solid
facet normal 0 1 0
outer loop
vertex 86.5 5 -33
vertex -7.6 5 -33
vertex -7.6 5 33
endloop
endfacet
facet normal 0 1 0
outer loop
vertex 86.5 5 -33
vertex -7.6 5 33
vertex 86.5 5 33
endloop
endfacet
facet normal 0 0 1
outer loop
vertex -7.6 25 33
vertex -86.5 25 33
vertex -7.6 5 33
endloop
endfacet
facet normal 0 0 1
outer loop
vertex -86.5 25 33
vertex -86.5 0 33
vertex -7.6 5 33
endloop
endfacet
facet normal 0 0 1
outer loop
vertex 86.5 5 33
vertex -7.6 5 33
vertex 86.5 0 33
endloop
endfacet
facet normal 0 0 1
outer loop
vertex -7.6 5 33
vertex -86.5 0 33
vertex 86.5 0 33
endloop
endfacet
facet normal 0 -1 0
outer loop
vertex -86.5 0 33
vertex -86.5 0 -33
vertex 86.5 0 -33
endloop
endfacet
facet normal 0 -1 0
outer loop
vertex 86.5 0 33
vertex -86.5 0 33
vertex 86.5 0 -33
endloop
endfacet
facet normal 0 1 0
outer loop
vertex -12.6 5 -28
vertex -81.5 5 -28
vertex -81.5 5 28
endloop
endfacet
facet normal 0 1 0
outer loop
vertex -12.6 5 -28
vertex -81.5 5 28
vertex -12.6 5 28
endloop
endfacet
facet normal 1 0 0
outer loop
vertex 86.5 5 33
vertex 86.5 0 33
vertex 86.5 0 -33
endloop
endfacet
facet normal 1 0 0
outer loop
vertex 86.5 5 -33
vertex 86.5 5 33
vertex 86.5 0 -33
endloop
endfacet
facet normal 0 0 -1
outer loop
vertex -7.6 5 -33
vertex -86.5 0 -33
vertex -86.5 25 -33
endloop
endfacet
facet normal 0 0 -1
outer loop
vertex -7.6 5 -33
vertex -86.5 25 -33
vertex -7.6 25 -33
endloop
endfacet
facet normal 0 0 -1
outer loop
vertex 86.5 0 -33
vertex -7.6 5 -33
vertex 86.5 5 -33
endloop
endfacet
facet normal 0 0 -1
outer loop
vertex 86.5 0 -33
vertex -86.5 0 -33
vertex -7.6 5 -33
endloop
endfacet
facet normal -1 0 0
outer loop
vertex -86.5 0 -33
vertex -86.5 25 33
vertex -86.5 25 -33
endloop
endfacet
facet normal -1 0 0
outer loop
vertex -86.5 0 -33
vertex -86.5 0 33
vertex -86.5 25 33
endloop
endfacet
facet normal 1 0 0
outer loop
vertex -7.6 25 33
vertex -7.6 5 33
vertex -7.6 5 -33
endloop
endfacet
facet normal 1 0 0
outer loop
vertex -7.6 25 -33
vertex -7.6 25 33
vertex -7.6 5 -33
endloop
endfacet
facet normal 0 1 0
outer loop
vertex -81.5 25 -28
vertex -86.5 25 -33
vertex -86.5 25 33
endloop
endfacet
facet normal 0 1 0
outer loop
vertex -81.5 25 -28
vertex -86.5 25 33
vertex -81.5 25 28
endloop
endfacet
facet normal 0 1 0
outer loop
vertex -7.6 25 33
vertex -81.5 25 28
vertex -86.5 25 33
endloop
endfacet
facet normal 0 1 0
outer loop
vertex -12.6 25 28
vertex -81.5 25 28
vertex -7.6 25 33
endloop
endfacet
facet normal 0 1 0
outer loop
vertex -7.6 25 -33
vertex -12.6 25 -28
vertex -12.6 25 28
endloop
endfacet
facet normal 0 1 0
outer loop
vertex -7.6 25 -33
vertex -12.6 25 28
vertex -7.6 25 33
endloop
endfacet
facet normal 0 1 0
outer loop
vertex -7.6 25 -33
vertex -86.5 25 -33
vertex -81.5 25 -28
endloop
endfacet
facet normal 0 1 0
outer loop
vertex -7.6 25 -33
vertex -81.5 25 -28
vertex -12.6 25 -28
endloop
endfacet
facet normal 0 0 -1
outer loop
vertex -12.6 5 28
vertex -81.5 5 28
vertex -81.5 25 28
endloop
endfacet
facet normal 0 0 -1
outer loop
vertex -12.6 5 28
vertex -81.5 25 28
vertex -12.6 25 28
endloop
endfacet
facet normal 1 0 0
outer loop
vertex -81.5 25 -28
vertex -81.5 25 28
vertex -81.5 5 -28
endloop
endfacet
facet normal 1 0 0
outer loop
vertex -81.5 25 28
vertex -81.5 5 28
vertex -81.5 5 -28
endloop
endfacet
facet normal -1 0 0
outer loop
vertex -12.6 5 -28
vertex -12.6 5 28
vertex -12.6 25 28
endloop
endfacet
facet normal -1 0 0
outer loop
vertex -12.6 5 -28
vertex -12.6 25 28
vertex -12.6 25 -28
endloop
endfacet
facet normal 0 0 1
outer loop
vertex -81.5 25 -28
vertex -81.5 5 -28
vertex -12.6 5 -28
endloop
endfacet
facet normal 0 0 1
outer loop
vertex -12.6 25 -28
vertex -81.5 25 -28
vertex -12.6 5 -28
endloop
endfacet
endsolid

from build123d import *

# Parameters (mm, degrees)
SKETCH1_W           = 173
SKETCH1_H           = 66
BOSS_EXTRUDE1_DEPTH = 5
SKETCH3_W           = 78.9
SKETCH3_H           = 66
BOSS_EXTRUDE2_DEPTH = 20
SHELL1_T            = -5


with BuildPart() as part:
    # Sketch1 → Boss-Extrude1 (new body)
    with BuildSketch(Plane(origin=(0, 0, 0), x_dir=(1, 0, 0), z_dir=(0, 1, 0))):
        Rectangle(SKETCH1_W, SKETCH1_H)
    extrude(amount=BOSS_EXTRUDE1_DEPTH)

    # Sketch3 → Boss-Extrude2 (add)
    with BuildSketch(Plane(origin=(0, 5, 0), x_dir=(1, 0, 0), z_dir=(0, 1, 0))):
        with Locations((-47.05, 0)):
            Rectangle(SKETCH3_W, SKETCH3_H)
    extrude(amount=BOSS_EXTRUDE2_DEPTH)

    # Shell1
    shell1_openings = [part.faces().sort_by_distance(p)[0] for p in [
        (-47.05, 25, 0),
    ]]
    offset(amount=SHELL1_T, openings=shell1_openings, kind=Kind.INTERSECTION)


solid = part.part
